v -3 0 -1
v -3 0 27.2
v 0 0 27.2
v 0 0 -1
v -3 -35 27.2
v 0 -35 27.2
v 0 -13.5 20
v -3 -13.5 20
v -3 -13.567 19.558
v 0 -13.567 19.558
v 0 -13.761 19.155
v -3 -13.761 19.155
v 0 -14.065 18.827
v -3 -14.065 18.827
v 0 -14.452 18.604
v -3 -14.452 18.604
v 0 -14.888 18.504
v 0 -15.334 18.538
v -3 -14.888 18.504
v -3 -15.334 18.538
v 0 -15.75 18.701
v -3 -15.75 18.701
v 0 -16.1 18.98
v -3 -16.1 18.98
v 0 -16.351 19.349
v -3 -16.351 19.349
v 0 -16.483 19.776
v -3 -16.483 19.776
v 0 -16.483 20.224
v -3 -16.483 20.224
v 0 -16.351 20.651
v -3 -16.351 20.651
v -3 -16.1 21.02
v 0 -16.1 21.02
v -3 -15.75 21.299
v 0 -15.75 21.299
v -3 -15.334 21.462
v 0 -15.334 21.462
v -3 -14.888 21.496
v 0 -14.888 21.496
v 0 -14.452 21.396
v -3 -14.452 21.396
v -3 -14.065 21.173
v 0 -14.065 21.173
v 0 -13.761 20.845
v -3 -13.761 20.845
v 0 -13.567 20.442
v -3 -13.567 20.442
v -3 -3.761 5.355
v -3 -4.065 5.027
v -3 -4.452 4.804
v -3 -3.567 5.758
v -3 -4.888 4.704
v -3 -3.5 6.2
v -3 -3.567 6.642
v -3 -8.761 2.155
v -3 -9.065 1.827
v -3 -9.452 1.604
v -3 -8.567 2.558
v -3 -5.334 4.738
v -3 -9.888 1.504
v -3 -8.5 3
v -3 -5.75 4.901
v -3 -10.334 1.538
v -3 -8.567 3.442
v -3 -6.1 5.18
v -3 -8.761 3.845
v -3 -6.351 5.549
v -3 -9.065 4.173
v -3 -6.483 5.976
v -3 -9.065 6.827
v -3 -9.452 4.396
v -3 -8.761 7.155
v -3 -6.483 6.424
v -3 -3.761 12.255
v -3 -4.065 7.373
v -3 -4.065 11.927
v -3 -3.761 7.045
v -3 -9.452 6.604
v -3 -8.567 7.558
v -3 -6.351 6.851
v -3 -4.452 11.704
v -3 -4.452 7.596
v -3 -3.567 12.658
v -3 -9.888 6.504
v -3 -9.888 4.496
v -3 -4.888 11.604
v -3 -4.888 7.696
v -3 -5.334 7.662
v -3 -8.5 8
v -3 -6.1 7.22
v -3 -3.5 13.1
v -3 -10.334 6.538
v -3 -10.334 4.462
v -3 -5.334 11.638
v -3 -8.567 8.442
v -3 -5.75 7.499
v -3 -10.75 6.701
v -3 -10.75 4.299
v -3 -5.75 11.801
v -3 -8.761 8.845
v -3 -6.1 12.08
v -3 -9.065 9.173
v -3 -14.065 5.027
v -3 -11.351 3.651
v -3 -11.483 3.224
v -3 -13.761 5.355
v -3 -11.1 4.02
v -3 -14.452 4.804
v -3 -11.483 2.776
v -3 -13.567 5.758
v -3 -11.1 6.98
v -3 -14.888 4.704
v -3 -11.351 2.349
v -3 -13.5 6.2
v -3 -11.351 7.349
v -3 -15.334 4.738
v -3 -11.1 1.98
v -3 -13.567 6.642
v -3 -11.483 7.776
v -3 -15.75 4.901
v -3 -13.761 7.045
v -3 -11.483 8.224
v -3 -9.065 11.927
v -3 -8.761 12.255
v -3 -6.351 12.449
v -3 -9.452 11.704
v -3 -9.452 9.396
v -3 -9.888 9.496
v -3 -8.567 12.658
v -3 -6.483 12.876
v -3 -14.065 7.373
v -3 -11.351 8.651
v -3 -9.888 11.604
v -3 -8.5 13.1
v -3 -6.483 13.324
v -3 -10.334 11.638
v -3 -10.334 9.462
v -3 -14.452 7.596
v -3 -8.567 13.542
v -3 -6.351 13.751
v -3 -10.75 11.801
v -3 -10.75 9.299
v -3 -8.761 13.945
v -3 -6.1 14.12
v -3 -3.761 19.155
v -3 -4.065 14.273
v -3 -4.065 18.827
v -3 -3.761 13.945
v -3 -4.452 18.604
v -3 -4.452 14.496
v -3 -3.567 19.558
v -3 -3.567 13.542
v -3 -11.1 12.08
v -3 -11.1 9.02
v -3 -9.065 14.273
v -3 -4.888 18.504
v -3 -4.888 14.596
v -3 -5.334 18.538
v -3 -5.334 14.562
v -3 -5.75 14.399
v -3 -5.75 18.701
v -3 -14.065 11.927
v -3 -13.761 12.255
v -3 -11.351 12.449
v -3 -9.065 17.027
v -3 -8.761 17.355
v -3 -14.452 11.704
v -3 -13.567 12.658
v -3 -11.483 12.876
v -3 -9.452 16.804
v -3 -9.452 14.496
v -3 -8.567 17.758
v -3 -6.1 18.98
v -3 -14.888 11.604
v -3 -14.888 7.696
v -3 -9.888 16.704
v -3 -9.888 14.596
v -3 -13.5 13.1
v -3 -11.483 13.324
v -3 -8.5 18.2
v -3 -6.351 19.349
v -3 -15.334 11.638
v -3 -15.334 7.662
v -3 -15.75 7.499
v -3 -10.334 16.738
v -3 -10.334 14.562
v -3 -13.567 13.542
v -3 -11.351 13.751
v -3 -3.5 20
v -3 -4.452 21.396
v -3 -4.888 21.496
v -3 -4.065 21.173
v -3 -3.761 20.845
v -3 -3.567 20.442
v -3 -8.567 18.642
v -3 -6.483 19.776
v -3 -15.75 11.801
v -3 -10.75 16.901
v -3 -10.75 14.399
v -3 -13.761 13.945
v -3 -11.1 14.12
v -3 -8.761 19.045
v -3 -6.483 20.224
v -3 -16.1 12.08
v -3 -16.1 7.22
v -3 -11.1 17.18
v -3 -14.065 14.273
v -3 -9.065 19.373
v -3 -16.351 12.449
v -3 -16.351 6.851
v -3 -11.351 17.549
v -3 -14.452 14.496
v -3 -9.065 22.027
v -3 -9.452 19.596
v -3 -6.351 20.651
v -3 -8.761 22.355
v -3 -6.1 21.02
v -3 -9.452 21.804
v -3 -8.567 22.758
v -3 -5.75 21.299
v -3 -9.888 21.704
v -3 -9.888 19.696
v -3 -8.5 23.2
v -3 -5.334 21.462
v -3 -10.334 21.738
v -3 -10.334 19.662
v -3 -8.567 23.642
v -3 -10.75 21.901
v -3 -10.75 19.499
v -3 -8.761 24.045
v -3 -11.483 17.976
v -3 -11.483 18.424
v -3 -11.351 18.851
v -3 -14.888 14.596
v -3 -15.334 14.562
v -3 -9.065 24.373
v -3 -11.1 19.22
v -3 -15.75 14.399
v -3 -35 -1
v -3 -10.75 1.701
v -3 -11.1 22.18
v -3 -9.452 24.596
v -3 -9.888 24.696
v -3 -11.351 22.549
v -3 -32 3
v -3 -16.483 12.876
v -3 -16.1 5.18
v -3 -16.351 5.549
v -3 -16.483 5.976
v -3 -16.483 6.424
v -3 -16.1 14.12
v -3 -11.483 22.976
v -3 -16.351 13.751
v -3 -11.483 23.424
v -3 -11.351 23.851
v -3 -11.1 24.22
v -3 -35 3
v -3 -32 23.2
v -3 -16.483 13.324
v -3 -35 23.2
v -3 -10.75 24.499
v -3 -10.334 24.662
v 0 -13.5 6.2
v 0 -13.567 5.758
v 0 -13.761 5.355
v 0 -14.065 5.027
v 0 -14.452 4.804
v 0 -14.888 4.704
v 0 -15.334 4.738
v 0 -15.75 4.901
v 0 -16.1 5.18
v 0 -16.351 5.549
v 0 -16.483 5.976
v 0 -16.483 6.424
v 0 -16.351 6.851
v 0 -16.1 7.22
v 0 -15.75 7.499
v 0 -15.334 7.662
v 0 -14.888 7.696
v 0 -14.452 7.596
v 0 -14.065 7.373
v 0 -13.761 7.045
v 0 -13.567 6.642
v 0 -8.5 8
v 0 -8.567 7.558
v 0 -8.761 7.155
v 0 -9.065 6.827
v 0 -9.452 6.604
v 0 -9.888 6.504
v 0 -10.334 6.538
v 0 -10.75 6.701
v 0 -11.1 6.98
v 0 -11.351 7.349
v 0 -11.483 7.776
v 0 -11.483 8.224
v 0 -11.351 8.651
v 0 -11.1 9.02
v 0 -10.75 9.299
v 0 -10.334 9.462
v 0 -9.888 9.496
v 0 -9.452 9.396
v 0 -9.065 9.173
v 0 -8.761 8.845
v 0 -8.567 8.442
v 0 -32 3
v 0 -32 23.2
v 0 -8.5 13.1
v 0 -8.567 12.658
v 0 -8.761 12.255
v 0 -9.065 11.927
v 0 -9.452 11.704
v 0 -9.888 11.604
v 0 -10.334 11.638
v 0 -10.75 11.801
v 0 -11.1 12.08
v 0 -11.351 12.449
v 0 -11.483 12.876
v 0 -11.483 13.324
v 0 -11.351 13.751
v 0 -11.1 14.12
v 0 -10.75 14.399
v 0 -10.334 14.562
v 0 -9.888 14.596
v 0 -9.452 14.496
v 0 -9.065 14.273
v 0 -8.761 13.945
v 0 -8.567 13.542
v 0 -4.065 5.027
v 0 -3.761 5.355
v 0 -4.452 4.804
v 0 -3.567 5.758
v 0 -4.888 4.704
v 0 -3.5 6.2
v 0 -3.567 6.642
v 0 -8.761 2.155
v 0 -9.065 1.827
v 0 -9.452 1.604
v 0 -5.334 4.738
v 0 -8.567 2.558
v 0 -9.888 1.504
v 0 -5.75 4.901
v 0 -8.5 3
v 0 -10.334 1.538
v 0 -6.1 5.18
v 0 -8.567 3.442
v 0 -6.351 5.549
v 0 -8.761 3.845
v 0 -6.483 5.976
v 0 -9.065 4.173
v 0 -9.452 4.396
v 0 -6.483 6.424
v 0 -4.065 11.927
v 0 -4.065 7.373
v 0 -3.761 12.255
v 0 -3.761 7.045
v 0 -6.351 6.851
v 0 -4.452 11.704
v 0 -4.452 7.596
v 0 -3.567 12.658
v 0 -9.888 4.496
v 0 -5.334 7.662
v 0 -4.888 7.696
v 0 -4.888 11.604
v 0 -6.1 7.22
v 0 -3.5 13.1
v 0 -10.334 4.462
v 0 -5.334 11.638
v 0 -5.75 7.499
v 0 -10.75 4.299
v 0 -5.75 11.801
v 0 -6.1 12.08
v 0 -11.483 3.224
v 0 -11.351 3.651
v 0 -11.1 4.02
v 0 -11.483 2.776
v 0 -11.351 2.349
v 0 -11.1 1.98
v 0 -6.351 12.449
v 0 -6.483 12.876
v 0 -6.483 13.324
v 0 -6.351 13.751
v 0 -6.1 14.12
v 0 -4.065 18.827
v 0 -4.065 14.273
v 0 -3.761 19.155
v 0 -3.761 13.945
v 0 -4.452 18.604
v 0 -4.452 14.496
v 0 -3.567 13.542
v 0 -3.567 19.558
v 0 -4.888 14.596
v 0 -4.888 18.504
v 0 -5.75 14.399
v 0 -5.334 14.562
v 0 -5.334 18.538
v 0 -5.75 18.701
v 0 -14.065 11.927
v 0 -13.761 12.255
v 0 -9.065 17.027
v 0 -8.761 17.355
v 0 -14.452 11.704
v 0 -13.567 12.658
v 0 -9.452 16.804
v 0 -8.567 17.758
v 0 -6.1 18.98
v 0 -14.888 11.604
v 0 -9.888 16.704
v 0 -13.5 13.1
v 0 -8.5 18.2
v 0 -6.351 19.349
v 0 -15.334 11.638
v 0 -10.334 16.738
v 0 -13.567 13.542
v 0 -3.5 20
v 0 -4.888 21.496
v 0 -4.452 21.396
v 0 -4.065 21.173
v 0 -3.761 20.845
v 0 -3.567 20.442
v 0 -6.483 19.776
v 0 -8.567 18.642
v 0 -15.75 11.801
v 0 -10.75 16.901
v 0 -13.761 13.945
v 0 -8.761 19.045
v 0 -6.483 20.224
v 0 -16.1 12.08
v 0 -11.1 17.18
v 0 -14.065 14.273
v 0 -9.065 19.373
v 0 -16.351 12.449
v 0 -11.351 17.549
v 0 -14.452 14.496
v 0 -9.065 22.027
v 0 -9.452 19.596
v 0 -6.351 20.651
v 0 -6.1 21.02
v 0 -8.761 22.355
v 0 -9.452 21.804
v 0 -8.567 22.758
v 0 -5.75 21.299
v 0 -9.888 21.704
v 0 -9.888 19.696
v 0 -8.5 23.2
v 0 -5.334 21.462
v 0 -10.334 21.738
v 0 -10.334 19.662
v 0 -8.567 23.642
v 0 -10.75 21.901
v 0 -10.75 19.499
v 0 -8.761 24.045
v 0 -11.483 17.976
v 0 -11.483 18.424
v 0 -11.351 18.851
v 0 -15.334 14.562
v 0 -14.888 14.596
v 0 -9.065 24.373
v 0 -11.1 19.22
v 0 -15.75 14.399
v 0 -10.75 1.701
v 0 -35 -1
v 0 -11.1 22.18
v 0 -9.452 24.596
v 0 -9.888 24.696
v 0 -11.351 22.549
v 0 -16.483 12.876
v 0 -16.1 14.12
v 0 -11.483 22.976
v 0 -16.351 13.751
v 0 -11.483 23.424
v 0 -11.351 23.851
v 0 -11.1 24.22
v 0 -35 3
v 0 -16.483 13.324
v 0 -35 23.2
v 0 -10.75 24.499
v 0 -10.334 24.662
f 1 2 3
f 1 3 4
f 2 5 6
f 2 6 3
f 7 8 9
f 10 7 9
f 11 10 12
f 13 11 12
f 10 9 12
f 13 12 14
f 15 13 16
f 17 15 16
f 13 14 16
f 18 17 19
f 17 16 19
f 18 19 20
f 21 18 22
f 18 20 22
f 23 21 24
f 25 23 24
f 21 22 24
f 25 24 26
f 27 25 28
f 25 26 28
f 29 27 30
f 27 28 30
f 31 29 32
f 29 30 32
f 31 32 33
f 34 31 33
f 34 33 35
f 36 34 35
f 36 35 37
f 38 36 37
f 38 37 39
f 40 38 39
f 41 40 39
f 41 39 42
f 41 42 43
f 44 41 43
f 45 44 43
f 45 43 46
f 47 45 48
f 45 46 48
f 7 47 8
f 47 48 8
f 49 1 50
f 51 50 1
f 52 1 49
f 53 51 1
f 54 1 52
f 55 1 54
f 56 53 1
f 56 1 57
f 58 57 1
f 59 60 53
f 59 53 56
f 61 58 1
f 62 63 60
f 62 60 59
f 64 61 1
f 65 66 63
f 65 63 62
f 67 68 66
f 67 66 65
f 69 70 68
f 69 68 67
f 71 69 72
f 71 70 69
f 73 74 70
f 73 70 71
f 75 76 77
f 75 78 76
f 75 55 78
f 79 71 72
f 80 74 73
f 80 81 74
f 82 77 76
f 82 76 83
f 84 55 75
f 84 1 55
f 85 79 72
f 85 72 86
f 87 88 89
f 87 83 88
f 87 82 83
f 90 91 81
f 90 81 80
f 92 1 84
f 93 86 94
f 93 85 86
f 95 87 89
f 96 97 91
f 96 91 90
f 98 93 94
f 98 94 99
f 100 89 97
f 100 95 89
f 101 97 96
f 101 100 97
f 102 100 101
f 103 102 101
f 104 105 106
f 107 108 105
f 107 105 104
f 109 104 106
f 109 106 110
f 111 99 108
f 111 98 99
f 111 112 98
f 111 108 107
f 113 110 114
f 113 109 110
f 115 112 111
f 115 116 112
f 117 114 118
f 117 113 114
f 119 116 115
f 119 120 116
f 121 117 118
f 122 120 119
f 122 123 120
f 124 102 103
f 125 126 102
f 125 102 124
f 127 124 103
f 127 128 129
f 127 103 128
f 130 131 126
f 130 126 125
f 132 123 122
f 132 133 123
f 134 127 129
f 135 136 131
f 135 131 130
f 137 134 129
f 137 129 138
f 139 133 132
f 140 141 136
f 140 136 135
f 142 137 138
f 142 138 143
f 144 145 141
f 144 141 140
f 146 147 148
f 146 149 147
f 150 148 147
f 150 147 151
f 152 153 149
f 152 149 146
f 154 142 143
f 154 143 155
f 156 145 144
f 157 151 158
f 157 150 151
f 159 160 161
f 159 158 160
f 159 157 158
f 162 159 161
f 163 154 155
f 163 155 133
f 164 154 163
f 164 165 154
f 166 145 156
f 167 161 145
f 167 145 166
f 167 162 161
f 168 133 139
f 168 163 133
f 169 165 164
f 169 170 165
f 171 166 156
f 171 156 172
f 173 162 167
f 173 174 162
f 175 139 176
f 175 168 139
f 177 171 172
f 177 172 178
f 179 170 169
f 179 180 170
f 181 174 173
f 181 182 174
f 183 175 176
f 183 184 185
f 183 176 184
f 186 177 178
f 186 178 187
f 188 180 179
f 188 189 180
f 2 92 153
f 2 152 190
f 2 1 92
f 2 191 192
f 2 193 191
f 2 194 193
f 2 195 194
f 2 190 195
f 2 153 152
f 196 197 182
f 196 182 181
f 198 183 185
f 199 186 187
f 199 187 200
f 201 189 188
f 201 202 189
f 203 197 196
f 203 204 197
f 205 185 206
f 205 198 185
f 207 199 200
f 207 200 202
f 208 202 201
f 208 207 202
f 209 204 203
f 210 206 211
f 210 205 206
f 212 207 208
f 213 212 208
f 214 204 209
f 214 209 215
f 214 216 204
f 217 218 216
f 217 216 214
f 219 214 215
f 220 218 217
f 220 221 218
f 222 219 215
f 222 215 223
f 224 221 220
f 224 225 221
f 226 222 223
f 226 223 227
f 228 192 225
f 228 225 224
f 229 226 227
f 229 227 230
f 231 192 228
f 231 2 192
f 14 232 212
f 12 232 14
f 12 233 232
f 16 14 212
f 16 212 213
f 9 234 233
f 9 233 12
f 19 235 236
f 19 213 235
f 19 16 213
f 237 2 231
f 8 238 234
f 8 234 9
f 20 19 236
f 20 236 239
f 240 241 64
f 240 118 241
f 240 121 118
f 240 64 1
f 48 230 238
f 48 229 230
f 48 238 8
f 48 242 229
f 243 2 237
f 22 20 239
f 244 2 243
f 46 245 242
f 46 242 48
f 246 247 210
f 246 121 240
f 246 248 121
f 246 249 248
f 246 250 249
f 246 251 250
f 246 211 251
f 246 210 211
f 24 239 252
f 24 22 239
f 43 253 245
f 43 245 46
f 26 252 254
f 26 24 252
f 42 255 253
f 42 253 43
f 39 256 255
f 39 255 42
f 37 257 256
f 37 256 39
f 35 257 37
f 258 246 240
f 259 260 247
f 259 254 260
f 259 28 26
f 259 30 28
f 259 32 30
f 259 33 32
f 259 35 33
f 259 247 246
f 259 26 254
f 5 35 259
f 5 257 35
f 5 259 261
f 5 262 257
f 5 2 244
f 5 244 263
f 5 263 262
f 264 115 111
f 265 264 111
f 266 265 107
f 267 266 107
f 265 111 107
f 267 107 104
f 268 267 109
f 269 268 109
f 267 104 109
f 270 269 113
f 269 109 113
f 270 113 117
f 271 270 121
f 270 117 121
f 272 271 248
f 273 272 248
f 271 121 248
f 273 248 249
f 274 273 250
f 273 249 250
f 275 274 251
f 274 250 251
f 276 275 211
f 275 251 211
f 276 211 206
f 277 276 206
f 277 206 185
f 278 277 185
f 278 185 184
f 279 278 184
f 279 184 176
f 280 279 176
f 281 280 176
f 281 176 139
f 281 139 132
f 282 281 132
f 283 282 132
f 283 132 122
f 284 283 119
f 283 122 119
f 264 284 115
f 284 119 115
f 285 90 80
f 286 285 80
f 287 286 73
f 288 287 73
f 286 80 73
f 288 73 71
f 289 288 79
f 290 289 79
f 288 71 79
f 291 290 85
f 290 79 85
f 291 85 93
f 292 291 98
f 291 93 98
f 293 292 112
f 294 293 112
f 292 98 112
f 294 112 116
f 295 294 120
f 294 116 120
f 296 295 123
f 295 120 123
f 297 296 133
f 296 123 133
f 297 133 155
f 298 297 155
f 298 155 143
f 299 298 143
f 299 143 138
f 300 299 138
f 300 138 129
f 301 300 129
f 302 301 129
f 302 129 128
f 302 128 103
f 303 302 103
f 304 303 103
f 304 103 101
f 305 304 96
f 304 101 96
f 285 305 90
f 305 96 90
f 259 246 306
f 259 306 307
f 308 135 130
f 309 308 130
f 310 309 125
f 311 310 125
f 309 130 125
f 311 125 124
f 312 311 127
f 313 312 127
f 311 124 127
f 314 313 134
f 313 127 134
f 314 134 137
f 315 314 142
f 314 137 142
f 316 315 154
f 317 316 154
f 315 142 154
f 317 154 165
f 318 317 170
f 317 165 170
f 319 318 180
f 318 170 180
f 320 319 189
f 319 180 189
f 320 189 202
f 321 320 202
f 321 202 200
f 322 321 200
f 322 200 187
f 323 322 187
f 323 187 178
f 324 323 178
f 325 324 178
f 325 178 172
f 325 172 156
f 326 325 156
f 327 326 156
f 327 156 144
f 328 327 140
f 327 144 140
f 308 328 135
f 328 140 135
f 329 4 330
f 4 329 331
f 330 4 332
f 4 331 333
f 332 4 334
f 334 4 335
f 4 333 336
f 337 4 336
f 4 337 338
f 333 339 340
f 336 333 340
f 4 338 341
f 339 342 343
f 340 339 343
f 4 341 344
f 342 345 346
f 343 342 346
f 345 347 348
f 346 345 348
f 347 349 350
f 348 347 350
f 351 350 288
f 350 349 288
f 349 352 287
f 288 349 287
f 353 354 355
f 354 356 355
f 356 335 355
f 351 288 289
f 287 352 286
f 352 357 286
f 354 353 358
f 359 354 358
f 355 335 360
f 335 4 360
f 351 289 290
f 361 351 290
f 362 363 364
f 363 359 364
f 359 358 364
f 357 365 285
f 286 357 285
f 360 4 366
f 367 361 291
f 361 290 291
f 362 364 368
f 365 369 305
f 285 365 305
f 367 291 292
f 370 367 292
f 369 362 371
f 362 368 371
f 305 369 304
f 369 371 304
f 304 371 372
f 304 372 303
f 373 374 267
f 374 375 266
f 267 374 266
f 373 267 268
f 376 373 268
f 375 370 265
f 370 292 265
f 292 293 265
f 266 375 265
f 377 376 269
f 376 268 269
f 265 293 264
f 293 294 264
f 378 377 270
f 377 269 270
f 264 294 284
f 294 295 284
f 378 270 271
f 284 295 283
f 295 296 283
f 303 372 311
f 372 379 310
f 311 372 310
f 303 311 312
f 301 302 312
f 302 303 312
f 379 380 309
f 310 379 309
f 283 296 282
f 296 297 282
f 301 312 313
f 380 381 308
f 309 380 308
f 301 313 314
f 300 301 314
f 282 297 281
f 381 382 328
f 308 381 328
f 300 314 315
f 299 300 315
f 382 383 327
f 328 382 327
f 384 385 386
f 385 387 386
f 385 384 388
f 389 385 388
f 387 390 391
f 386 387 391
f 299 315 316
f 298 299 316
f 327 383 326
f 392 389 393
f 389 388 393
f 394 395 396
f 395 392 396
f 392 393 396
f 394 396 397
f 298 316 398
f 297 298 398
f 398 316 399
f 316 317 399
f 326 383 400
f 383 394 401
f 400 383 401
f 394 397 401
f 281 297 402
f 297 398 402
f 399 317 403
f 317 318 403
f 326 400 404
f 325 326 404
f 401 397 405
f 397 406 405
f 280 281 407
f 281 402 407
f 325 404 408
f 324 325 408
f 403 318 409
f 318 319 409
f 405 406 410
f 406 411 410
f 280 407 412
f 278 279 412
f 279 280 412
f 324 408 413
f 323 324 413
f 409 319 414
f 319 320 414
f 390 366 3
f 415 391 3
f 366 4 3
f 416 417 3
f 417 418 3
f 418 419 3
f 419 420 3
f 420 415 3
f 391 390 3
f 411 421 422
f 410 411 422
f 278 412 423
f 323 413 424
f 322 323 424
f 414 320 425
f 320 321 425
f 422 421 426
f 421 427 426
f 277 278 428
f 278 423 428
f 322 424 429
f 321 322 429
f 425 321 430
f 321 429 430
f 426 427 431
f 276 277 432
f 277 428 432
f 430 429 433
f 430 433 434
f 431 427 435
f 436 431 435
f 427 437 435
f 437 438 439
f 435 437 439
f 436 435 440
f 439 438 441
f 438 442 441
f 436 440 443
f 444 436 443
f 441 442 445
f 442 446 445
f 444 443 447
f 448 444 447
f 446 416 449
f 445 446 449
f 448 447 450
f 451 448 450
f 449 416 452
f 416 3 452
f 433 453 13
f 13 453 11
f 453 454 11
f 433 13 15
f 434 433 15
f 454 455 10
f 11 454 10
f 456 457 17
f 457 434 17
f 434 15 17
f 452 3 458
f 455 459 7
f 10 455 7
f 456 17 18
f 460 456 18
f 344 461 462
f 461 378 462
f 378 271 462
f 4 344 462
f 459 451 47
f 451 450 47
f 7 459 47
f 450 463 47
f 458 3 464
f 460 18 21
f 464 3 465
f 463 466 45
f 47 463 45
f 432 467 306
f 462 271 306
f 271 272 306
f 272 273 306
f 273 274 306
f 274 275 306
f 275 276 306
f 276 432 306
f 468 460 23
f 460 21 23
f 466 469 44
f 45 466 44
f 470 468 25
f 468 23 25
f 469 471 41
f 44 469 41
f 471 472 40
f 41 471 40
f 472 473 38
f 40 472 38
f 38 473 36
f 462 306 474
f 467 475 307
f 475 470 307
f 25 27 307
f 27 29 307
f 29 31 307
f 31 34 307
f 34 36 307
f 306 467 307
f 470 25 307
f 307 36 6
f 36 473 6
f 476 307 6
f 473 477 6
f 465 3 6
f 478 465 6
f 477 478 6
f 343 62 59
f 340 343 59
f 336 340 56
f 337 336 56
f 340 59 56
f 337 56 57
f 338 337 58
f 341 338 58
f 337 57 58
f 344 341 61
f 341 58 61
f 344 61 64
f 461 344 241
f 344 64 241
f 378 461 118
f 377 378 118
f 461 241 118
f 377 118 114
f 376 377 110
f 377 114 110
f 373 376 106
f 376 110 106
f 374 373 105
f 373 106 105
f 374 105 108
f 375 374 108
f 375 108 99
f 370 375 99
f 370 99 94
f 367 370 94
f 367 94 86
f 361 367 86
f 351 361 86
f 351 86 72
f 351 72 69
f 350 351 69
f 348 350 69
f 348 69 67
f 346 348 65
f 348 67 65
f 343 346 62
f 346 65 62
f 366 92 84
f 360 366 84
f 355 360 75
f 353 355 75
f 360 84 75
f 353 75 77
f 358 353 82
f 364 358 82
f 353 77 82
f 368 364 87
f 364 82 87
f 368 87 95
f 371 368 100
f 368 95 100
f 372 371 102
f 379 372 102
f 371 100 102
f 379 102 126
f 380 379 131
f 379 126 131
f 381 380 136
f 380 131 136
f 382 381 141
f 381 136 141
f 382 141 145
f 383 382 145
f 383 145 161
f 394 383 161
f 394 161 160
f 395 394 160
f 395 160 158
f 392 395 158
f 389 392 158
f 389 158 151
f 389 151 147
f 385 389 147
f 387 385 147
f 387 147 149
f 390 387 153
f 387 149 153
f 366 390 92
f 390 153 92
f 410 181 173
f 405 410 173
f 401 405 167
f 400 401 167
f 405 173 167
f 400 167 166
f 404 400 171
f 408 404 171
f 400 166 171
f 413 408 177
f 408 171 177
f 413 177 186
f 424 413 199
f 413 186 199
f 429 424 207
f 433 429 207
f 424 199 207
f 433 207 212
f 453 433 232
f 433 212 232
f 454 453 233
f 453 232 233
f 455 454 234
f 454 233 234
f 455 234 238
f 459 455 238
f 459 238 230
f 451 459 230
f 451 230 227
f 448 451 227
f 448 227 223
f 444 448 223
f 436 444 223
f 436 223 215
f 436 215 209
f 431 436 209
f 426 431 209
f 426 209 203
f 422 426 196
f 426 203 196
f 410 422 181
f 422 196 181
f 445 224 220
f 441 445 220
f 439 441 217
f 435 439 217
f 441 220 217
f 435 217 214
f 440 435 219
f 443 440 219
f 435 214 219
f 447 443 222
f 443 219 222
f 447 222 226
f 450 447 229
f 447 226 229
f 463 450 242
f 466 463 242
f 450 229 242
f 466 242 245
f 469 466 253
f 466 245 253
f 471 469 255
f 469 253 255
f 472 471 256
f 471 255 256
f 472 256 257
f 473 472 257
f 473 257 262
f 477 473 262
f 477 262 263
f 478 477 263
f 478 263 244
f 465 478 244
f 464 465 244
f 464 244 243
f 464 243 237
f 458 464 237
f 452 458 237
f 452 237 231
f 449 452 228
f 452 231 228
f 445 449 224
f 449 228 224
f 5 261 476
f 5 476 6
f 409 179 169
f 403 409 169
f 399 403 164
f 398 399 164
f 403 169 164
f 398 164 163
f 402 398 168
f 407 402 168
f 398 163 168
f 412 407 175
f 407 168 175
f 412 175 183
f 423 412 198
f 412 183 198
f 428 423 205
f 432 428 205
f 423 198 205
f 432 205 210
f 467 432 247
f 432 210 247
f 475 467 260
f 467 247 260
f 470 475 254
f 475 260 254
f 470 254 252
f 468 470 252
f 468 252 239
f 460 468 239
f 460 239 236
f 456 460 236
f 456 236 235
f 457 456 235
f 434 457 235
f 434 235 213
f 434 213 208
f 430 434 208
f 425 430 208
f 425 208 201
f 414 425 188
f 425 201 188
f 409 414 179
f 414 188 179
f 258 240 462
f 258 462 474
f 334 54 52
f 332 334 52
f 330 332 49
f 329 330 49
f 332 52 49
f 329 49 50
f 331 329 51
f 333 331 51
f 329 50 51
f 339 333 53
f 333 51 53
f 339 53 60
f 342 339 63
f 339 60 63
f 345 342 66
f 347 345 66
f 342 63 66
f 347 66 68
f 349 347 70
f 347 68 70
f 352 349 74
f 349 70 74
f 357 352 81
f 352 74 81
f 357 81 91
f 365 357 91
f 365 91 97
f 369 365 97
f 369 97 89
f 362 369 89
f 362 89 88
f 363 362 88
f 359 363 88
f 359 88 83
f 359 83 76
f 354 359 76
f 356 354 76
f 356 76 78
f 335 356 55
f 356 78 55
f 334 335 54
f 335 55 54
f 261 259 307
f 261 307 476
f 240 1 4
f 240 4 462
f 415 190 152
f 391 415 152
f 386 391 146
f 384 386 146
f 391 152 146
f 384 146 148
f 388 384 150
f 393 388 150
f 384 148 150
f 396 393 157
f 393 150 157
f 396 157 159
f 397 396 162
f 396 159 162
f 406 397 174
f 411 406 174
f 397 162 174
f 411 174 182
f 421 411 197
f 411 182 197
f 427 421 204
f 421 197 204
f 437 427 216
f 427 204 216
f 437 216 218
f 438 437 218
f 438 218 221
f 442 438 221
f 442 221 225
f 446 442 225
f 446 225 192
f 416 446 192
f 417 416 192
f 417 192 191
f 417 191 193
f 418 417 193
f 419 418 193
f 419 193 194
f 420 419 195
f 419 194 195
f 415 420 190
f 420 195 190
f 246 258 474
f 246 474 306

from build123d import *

# Parameters (mm, degrees)
ESQUISSE1_R        = 1.5
BOSS_EXTRU_1_DEPTH = 3


with BuildPart() as part:
    # Esquisse1 → Boss.-Extru.1 (new body)
    with BuildSketch(Plane(origin=(-3, 0, 0), x_dir=(0, -1, 0), z_dir=(-1, 0, 0))):
        Polygon((35, 27.2), (0, 27.2), (0, -1), (35, -1), (35, 3), (32, 3), (32, 23.2), (35, 23.2), align=None)
        with Locations(Location((5, 6.2, 0), (0, 0, 180))):
            Circle(ESQUISSE1_R, mode=Mode.SUBTRACT)
        with Locations(Location((10, 8, 0), (0, 0, 180))):
            Circle(ESQUISSE1_R, mode=Mode.SUBTRACT)
        with Locations(Location((15, 20, 0), (0, 0, 180))):
            Circle(ESQUISSE1_R, mode=Mode.SUBTRACT)
        with Locations(Location((5, 20, 0), (0, 0, 180))):
            Circle(ESQUISSE1_R, mode=Mode.SUBTRACT)
        with Locations(Location((15, 6.2, 0), (0, 0, 180))):
            Circle(ESQUISSE1_R, mode=Mode.SUBTRACT)
        with Locations(Location((10, 13.1, 0), (0, 0, 180))):
            Circle(ESQUISSE1_R, mode=Mode.SUBTRACT)
        with Locations(Location((10, 3, 0), (0, 0, 180))):
            Circle(ESQUISSE1_R, mode=Mode.SUBTRACT)
        with Locations(Location((5, 13.1, 0), (0, 0, 180))):
            Circle(ESQUISSE1_R, mode=Mode.SUBTRACT)
        with Locations(Location((15, 13.1, 0), (0, 0, 180))):
            Circle(ESQUISSE1_R, mode=Mode.SUBTRACT)
        with Locations(Location((9.99998284, 23.2, 0), (0, 0, 180))):
            Circle(ESQUISSE1_R, mode=Mode.SUBTRACT)
        with Locations(Location((9.99998284, 18.2, 0), (0, 0, 180))):
            Circle(ESQUISSE1_R, mode=Mode.SUBTRACT)
    extrude(amount=-BOSS_EXTRU_1_DEPTH)


solid = part.part
